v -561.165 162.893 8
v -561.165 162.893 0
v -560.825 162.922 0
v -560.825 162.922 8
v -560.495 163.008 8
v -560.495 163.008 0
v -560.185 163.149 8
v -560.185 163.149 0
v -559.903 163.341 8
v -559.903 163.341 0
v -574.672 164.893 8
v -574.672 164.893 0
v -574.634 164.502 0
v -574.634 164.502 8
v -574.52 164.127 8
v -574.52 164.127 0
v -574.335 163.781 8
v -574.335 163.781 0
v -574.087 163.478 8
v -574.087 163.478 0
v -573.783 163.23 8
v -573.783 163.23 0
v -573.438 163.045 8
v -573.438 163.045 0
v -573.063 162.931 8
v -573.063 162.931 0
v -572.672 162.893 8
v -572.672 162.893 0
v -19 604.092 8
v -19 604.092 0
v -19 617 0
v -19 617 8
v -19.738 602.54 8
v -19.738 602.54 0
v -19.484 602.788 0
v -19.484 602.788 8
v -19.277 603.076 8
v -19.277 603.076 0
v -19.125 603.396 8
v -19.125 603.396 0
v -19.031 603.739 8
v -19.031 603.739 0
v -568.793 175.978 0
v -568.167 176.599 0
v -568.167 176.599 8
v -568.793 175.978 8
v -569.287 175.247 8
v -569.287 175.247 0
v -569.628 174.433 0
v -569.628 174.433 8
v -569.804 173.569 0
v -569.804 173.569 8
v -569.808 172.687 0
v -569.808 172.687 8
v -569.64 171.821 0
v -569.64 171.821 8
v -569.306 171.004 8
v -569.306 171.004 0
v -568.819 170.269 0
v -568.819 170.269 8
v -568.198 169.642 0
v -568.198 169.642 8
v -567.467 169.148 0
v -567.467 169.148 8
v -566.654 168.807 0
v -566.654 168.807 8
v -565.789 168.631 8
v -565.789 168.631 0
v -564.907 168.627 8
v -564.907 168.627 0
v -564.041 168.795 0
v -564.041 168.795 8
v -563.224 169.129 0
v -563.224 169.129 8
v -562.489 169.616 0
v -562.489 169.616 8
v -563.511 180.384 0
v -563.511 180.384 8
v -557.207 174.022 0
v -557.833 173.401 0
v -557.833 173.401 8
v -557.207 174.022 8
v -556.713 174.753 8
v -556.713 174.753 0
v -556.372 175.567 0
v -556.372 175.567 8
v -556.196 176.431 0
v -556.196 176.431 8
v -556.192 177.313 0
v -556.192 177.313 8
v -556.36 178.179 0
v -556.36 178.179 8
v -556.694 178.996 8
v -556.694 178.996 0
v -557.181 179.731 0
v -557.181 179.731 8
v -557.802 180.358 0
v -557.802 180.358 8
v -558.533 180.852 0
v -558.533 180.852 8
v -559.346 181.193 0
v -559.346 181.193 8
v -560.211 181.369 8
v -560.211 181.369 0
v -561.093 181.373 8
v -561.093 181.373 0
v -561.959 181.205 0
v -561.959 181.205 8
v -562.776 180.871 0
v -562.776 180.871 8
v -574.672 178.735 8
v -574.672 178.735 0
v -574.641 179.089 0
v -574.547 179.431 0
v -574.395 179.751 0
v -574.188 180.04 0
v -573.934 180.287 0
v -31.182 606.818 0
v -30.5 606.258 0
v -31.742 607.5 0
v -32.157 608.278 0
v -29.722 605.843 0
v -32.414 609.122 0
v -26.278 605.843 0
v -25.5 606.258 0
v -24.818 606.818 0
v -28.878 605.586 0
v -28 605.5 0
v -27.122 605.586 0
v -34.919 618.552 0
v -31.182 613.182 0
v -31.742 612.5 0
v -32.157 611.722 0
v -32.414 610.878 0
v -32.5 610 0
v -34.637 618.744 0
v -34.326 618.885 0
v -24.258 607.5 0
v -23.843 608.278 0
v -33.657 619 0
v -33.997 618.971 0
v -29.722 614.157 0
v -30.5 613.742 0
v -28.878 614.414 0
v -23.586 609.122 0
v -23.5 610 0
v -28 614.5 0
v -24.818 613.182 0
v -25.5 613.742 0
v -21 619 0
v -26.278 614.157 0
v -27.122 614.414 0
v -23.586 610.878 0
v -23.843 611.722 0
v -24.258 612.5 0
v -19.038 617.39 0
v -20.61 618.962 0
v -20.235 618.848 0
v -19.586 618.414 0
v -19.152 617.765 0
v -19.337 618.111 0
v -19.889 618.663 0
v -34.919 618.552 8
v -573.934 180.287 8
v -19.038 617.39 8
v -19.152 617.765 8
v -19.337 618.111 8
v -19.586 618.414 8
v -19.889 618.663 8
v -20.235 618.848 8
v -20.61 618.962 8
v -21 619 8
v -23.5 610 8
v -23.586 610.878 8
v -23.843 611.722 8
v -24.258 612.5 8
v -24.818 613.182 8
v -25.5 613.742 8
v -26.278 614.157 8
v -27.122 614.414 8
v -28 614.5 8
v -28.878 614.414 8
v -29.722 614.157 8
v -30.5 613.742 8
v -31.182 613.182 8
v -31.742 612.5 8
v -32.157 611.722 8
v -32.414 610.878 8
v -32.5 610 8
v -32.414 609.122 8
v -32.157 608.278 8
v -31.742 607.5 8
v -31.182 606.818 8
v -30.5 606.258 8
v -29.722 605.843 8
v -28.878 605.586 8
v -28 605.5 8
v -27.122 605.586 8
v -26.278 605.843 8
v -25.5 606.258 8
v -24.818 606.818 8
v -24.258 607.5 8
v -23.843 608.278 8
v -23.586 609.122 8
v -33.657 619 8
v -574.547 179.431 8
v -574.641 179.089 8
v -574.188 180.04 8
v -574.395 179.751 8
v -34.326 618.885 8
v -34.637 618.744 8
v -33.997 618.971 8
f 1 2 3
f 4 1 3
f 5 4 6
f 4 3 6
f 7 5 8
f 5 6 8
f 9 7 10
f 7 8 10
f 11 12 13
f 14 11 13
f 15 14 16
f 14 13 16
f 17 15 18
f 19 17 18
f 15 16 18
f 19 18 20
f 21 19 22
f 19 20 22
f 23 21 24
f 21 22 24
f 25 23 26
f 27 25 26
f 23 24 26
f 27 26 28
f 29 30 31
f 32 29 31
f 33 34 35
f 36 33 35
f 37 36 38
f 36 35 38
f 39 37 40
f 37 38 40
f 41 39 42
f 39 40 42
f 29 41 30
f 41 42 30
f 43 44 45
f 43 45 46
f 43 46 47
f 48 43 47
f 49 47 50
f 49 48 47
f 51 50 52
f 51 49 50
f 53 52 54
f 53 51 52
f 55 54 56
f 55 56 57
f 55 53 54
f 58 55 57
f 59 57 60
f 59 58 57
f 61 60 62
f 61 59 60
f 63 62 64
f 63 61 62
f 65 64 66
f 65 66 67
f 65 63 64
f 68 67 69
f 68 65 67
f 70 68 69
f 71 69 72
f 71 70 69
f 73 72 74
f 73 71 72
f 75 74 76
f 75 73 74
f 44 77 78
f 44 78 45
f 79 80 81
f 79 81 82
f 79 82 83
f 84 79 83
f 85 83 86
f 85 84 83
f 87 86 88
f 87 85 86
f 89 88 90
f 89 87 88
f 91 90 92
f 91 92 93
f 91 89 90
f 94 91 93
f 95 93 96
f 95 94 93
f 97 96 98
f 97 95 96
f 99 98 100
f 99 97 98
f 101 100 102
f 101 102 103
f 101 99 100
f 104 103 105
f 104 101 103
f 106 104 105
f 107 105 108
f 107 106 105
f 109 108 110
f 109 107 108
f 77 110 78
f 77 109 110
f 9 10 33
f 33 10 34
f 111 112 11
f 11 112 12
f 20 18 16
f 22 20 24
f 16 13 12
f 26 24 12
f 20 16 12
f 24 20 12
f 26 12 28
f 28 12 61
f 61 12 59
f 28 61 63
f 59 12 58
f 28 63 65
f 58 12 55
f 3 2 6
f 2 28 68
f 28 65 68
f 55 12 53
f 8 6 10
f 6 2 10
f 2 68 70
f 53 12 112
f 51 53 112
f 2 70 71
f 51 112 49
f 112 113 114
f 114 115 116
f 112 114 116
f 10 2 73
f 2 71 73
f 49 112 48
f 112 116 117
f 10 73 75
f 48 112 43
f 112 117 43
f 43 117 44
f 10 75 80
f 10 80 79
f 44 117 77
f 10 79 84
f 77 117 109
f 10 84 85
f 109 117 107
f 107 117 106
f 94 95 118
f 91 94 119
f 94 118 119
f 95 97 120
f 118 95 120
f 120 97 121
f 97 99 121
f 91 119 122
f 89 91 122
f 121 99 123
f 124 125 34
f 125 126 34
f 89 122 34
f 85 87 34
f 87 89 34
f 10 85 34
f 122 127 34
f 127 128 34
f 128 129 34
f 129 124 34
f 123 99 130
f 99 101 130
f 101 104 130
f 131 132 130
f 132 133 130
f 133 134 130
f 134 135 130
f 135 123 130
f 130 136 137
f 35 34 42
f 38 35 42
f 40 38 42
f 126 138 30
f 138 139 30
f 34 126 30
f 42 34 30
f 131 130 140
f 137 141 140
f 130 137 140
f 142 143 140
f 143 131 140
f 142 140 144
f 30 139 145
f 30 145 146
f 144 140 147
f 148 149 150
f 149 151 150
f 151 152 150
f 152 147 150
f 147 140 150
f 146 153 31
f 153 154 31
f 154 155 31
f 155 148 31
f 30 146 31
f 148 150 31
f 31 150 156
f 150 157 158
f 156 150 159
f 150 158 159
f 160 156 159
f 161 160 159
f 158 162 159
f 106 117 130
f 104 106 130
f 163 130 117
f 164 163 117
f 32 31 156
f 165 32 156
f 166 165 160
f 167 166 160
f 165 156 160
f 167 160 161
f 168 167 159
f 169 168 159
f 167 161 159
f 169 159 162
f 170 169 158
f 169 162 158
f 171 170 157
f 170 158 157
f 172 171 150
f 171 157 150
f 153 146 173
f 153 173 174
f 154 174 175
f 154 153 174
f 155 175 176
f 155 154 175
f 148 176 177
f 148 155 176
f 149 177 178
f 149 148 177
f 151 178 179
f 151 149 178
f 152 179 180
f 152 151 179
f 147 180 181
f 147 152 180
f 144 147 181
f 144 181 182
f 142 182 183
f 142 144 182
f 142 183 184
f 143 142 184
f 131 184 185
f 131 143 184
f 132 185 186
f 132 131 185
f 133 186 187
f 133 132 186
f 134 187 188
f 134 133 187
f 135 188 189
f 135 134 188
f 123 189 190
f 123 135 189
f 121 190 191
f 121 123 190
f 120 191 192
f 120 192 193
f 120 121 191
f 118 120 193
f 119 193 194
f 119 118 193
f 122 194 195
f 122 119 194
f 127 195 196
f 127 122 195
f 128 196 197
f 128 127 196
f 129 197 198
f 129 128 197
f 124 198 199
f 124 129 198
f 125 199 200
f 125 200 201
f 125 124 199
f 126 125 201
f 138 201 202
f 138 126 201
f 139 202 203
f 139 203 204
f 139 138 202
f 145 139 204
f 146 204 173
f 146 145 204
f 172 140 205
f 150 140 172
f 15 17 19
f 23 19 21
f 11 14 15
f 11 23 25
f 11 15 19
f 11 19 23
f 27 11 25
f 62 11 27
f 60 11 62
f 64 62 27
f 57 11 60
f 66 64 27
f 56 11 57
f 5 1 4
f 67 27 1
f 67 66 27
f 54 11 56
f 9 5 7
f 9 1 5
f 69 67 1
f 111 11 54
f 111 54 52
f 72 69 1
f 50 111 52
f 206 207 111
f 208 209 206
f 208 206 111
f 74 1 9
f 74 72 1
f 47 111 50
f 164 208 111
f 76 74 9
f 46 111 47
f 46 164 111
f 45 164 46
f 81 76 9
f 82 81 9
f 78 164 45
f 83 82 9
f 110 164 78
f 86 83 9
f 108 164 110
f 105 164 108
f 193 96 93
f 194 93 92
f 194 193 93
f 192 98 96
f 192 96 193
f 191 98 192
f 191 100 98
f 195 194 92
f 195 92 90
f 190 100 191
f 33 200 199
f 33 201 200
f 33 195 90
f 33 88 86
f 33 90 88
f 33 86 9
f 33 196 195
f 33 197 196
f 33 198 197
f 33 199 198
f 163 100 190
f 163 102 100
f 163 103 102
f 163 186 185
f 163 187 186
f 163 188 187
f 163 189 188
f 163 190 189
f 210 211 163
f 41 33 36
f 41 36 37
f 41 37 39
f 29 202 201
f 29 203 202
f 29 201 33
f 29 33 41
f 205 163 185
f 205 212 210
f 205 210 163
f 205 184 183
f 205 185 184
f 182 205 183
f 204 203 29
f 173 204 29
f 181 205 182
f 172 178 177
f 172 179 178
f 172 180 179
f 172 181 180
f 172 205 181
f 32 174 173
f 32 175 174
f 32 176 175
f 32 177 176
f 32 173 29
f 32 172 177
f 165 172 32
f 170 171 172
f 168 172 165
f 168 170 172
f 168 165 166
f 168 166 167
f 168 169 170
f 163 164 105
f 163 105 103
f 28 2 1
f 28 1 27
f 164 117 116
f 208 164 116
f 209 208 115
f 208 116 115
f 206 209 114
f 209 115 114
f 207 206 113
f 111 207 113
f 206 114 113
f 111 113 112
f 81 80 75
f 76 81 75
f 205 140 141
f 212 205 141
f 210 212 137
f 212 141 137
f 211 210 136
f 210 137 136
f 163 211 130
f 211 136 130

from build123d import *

# Parameters (mm, degrees)
SKETCH_R  = 4.5
PAD_DEPTH = 8


with BuildPart() as part:
    # Sketch → Pad (new body)
    with BuildSketch(Plane.XY):
        with BuildLine():
            Line((-34.918649, 618.551784), (-573.934055, 180.286922))
            ThreePointArc((-573.934055, 180.286922), (-574.47835, 179.594363), (-574.672324, 178.735138))
            Line((-574.672324, 178.735138), (-574.672324, 164.892597))
            ThreePointArc((-574.672324, 164.892597), (-574.086537, 163.478383), (-572.672324, 162.892597))
            Line((-561.164831, 162.892597), (-572.672324, 162.892597))
            ThreePointArc((-561.164831, 162.892597), (-560.495341, 163.007979), (-559.903099, 163.340812))
            Line((-559.903099, 163.340812), (-19.738269, 602.540254))
            ThreePointArc((-19.738269, 602.540254), (-19.193974, 603.232813), (-19, 604.092038))
            Line((-19, 604.092038), (-19, 617))
            ThreePointArc((-19, 617), (-19.585786, 618.414214), (-21, 619))
            Line((-33.656918, 619), (-21, 619))
            ThreePointArc((-33.656918, 619), (-34.326407, 618.884618), (-34.918649, 618.551784))
        make_face()
        with Locations((-28, 610)):
            Circle(SKETCH_R, mode=Mode.SUBTRACT)
        with BuildLine():
            Line((-563.511219, 180.384111), (-568.166572, 176.598918))
            ThreePointArc((-568.166572, 176.598918), (-568.819191, 170.268508), (-562.488781, 169.615889))
            Line((-557.833428, 173.401082), (-562.488781, 169.615889))
            ThreePointArc((-557.833428, 173.401082), (-557.180809, 179.731492), (-563.511219, 180.384111))
        make_face(mode=Mode.SUBTRACT)
    extrude(amount=PAD_DEPTH)


solid = part.part
